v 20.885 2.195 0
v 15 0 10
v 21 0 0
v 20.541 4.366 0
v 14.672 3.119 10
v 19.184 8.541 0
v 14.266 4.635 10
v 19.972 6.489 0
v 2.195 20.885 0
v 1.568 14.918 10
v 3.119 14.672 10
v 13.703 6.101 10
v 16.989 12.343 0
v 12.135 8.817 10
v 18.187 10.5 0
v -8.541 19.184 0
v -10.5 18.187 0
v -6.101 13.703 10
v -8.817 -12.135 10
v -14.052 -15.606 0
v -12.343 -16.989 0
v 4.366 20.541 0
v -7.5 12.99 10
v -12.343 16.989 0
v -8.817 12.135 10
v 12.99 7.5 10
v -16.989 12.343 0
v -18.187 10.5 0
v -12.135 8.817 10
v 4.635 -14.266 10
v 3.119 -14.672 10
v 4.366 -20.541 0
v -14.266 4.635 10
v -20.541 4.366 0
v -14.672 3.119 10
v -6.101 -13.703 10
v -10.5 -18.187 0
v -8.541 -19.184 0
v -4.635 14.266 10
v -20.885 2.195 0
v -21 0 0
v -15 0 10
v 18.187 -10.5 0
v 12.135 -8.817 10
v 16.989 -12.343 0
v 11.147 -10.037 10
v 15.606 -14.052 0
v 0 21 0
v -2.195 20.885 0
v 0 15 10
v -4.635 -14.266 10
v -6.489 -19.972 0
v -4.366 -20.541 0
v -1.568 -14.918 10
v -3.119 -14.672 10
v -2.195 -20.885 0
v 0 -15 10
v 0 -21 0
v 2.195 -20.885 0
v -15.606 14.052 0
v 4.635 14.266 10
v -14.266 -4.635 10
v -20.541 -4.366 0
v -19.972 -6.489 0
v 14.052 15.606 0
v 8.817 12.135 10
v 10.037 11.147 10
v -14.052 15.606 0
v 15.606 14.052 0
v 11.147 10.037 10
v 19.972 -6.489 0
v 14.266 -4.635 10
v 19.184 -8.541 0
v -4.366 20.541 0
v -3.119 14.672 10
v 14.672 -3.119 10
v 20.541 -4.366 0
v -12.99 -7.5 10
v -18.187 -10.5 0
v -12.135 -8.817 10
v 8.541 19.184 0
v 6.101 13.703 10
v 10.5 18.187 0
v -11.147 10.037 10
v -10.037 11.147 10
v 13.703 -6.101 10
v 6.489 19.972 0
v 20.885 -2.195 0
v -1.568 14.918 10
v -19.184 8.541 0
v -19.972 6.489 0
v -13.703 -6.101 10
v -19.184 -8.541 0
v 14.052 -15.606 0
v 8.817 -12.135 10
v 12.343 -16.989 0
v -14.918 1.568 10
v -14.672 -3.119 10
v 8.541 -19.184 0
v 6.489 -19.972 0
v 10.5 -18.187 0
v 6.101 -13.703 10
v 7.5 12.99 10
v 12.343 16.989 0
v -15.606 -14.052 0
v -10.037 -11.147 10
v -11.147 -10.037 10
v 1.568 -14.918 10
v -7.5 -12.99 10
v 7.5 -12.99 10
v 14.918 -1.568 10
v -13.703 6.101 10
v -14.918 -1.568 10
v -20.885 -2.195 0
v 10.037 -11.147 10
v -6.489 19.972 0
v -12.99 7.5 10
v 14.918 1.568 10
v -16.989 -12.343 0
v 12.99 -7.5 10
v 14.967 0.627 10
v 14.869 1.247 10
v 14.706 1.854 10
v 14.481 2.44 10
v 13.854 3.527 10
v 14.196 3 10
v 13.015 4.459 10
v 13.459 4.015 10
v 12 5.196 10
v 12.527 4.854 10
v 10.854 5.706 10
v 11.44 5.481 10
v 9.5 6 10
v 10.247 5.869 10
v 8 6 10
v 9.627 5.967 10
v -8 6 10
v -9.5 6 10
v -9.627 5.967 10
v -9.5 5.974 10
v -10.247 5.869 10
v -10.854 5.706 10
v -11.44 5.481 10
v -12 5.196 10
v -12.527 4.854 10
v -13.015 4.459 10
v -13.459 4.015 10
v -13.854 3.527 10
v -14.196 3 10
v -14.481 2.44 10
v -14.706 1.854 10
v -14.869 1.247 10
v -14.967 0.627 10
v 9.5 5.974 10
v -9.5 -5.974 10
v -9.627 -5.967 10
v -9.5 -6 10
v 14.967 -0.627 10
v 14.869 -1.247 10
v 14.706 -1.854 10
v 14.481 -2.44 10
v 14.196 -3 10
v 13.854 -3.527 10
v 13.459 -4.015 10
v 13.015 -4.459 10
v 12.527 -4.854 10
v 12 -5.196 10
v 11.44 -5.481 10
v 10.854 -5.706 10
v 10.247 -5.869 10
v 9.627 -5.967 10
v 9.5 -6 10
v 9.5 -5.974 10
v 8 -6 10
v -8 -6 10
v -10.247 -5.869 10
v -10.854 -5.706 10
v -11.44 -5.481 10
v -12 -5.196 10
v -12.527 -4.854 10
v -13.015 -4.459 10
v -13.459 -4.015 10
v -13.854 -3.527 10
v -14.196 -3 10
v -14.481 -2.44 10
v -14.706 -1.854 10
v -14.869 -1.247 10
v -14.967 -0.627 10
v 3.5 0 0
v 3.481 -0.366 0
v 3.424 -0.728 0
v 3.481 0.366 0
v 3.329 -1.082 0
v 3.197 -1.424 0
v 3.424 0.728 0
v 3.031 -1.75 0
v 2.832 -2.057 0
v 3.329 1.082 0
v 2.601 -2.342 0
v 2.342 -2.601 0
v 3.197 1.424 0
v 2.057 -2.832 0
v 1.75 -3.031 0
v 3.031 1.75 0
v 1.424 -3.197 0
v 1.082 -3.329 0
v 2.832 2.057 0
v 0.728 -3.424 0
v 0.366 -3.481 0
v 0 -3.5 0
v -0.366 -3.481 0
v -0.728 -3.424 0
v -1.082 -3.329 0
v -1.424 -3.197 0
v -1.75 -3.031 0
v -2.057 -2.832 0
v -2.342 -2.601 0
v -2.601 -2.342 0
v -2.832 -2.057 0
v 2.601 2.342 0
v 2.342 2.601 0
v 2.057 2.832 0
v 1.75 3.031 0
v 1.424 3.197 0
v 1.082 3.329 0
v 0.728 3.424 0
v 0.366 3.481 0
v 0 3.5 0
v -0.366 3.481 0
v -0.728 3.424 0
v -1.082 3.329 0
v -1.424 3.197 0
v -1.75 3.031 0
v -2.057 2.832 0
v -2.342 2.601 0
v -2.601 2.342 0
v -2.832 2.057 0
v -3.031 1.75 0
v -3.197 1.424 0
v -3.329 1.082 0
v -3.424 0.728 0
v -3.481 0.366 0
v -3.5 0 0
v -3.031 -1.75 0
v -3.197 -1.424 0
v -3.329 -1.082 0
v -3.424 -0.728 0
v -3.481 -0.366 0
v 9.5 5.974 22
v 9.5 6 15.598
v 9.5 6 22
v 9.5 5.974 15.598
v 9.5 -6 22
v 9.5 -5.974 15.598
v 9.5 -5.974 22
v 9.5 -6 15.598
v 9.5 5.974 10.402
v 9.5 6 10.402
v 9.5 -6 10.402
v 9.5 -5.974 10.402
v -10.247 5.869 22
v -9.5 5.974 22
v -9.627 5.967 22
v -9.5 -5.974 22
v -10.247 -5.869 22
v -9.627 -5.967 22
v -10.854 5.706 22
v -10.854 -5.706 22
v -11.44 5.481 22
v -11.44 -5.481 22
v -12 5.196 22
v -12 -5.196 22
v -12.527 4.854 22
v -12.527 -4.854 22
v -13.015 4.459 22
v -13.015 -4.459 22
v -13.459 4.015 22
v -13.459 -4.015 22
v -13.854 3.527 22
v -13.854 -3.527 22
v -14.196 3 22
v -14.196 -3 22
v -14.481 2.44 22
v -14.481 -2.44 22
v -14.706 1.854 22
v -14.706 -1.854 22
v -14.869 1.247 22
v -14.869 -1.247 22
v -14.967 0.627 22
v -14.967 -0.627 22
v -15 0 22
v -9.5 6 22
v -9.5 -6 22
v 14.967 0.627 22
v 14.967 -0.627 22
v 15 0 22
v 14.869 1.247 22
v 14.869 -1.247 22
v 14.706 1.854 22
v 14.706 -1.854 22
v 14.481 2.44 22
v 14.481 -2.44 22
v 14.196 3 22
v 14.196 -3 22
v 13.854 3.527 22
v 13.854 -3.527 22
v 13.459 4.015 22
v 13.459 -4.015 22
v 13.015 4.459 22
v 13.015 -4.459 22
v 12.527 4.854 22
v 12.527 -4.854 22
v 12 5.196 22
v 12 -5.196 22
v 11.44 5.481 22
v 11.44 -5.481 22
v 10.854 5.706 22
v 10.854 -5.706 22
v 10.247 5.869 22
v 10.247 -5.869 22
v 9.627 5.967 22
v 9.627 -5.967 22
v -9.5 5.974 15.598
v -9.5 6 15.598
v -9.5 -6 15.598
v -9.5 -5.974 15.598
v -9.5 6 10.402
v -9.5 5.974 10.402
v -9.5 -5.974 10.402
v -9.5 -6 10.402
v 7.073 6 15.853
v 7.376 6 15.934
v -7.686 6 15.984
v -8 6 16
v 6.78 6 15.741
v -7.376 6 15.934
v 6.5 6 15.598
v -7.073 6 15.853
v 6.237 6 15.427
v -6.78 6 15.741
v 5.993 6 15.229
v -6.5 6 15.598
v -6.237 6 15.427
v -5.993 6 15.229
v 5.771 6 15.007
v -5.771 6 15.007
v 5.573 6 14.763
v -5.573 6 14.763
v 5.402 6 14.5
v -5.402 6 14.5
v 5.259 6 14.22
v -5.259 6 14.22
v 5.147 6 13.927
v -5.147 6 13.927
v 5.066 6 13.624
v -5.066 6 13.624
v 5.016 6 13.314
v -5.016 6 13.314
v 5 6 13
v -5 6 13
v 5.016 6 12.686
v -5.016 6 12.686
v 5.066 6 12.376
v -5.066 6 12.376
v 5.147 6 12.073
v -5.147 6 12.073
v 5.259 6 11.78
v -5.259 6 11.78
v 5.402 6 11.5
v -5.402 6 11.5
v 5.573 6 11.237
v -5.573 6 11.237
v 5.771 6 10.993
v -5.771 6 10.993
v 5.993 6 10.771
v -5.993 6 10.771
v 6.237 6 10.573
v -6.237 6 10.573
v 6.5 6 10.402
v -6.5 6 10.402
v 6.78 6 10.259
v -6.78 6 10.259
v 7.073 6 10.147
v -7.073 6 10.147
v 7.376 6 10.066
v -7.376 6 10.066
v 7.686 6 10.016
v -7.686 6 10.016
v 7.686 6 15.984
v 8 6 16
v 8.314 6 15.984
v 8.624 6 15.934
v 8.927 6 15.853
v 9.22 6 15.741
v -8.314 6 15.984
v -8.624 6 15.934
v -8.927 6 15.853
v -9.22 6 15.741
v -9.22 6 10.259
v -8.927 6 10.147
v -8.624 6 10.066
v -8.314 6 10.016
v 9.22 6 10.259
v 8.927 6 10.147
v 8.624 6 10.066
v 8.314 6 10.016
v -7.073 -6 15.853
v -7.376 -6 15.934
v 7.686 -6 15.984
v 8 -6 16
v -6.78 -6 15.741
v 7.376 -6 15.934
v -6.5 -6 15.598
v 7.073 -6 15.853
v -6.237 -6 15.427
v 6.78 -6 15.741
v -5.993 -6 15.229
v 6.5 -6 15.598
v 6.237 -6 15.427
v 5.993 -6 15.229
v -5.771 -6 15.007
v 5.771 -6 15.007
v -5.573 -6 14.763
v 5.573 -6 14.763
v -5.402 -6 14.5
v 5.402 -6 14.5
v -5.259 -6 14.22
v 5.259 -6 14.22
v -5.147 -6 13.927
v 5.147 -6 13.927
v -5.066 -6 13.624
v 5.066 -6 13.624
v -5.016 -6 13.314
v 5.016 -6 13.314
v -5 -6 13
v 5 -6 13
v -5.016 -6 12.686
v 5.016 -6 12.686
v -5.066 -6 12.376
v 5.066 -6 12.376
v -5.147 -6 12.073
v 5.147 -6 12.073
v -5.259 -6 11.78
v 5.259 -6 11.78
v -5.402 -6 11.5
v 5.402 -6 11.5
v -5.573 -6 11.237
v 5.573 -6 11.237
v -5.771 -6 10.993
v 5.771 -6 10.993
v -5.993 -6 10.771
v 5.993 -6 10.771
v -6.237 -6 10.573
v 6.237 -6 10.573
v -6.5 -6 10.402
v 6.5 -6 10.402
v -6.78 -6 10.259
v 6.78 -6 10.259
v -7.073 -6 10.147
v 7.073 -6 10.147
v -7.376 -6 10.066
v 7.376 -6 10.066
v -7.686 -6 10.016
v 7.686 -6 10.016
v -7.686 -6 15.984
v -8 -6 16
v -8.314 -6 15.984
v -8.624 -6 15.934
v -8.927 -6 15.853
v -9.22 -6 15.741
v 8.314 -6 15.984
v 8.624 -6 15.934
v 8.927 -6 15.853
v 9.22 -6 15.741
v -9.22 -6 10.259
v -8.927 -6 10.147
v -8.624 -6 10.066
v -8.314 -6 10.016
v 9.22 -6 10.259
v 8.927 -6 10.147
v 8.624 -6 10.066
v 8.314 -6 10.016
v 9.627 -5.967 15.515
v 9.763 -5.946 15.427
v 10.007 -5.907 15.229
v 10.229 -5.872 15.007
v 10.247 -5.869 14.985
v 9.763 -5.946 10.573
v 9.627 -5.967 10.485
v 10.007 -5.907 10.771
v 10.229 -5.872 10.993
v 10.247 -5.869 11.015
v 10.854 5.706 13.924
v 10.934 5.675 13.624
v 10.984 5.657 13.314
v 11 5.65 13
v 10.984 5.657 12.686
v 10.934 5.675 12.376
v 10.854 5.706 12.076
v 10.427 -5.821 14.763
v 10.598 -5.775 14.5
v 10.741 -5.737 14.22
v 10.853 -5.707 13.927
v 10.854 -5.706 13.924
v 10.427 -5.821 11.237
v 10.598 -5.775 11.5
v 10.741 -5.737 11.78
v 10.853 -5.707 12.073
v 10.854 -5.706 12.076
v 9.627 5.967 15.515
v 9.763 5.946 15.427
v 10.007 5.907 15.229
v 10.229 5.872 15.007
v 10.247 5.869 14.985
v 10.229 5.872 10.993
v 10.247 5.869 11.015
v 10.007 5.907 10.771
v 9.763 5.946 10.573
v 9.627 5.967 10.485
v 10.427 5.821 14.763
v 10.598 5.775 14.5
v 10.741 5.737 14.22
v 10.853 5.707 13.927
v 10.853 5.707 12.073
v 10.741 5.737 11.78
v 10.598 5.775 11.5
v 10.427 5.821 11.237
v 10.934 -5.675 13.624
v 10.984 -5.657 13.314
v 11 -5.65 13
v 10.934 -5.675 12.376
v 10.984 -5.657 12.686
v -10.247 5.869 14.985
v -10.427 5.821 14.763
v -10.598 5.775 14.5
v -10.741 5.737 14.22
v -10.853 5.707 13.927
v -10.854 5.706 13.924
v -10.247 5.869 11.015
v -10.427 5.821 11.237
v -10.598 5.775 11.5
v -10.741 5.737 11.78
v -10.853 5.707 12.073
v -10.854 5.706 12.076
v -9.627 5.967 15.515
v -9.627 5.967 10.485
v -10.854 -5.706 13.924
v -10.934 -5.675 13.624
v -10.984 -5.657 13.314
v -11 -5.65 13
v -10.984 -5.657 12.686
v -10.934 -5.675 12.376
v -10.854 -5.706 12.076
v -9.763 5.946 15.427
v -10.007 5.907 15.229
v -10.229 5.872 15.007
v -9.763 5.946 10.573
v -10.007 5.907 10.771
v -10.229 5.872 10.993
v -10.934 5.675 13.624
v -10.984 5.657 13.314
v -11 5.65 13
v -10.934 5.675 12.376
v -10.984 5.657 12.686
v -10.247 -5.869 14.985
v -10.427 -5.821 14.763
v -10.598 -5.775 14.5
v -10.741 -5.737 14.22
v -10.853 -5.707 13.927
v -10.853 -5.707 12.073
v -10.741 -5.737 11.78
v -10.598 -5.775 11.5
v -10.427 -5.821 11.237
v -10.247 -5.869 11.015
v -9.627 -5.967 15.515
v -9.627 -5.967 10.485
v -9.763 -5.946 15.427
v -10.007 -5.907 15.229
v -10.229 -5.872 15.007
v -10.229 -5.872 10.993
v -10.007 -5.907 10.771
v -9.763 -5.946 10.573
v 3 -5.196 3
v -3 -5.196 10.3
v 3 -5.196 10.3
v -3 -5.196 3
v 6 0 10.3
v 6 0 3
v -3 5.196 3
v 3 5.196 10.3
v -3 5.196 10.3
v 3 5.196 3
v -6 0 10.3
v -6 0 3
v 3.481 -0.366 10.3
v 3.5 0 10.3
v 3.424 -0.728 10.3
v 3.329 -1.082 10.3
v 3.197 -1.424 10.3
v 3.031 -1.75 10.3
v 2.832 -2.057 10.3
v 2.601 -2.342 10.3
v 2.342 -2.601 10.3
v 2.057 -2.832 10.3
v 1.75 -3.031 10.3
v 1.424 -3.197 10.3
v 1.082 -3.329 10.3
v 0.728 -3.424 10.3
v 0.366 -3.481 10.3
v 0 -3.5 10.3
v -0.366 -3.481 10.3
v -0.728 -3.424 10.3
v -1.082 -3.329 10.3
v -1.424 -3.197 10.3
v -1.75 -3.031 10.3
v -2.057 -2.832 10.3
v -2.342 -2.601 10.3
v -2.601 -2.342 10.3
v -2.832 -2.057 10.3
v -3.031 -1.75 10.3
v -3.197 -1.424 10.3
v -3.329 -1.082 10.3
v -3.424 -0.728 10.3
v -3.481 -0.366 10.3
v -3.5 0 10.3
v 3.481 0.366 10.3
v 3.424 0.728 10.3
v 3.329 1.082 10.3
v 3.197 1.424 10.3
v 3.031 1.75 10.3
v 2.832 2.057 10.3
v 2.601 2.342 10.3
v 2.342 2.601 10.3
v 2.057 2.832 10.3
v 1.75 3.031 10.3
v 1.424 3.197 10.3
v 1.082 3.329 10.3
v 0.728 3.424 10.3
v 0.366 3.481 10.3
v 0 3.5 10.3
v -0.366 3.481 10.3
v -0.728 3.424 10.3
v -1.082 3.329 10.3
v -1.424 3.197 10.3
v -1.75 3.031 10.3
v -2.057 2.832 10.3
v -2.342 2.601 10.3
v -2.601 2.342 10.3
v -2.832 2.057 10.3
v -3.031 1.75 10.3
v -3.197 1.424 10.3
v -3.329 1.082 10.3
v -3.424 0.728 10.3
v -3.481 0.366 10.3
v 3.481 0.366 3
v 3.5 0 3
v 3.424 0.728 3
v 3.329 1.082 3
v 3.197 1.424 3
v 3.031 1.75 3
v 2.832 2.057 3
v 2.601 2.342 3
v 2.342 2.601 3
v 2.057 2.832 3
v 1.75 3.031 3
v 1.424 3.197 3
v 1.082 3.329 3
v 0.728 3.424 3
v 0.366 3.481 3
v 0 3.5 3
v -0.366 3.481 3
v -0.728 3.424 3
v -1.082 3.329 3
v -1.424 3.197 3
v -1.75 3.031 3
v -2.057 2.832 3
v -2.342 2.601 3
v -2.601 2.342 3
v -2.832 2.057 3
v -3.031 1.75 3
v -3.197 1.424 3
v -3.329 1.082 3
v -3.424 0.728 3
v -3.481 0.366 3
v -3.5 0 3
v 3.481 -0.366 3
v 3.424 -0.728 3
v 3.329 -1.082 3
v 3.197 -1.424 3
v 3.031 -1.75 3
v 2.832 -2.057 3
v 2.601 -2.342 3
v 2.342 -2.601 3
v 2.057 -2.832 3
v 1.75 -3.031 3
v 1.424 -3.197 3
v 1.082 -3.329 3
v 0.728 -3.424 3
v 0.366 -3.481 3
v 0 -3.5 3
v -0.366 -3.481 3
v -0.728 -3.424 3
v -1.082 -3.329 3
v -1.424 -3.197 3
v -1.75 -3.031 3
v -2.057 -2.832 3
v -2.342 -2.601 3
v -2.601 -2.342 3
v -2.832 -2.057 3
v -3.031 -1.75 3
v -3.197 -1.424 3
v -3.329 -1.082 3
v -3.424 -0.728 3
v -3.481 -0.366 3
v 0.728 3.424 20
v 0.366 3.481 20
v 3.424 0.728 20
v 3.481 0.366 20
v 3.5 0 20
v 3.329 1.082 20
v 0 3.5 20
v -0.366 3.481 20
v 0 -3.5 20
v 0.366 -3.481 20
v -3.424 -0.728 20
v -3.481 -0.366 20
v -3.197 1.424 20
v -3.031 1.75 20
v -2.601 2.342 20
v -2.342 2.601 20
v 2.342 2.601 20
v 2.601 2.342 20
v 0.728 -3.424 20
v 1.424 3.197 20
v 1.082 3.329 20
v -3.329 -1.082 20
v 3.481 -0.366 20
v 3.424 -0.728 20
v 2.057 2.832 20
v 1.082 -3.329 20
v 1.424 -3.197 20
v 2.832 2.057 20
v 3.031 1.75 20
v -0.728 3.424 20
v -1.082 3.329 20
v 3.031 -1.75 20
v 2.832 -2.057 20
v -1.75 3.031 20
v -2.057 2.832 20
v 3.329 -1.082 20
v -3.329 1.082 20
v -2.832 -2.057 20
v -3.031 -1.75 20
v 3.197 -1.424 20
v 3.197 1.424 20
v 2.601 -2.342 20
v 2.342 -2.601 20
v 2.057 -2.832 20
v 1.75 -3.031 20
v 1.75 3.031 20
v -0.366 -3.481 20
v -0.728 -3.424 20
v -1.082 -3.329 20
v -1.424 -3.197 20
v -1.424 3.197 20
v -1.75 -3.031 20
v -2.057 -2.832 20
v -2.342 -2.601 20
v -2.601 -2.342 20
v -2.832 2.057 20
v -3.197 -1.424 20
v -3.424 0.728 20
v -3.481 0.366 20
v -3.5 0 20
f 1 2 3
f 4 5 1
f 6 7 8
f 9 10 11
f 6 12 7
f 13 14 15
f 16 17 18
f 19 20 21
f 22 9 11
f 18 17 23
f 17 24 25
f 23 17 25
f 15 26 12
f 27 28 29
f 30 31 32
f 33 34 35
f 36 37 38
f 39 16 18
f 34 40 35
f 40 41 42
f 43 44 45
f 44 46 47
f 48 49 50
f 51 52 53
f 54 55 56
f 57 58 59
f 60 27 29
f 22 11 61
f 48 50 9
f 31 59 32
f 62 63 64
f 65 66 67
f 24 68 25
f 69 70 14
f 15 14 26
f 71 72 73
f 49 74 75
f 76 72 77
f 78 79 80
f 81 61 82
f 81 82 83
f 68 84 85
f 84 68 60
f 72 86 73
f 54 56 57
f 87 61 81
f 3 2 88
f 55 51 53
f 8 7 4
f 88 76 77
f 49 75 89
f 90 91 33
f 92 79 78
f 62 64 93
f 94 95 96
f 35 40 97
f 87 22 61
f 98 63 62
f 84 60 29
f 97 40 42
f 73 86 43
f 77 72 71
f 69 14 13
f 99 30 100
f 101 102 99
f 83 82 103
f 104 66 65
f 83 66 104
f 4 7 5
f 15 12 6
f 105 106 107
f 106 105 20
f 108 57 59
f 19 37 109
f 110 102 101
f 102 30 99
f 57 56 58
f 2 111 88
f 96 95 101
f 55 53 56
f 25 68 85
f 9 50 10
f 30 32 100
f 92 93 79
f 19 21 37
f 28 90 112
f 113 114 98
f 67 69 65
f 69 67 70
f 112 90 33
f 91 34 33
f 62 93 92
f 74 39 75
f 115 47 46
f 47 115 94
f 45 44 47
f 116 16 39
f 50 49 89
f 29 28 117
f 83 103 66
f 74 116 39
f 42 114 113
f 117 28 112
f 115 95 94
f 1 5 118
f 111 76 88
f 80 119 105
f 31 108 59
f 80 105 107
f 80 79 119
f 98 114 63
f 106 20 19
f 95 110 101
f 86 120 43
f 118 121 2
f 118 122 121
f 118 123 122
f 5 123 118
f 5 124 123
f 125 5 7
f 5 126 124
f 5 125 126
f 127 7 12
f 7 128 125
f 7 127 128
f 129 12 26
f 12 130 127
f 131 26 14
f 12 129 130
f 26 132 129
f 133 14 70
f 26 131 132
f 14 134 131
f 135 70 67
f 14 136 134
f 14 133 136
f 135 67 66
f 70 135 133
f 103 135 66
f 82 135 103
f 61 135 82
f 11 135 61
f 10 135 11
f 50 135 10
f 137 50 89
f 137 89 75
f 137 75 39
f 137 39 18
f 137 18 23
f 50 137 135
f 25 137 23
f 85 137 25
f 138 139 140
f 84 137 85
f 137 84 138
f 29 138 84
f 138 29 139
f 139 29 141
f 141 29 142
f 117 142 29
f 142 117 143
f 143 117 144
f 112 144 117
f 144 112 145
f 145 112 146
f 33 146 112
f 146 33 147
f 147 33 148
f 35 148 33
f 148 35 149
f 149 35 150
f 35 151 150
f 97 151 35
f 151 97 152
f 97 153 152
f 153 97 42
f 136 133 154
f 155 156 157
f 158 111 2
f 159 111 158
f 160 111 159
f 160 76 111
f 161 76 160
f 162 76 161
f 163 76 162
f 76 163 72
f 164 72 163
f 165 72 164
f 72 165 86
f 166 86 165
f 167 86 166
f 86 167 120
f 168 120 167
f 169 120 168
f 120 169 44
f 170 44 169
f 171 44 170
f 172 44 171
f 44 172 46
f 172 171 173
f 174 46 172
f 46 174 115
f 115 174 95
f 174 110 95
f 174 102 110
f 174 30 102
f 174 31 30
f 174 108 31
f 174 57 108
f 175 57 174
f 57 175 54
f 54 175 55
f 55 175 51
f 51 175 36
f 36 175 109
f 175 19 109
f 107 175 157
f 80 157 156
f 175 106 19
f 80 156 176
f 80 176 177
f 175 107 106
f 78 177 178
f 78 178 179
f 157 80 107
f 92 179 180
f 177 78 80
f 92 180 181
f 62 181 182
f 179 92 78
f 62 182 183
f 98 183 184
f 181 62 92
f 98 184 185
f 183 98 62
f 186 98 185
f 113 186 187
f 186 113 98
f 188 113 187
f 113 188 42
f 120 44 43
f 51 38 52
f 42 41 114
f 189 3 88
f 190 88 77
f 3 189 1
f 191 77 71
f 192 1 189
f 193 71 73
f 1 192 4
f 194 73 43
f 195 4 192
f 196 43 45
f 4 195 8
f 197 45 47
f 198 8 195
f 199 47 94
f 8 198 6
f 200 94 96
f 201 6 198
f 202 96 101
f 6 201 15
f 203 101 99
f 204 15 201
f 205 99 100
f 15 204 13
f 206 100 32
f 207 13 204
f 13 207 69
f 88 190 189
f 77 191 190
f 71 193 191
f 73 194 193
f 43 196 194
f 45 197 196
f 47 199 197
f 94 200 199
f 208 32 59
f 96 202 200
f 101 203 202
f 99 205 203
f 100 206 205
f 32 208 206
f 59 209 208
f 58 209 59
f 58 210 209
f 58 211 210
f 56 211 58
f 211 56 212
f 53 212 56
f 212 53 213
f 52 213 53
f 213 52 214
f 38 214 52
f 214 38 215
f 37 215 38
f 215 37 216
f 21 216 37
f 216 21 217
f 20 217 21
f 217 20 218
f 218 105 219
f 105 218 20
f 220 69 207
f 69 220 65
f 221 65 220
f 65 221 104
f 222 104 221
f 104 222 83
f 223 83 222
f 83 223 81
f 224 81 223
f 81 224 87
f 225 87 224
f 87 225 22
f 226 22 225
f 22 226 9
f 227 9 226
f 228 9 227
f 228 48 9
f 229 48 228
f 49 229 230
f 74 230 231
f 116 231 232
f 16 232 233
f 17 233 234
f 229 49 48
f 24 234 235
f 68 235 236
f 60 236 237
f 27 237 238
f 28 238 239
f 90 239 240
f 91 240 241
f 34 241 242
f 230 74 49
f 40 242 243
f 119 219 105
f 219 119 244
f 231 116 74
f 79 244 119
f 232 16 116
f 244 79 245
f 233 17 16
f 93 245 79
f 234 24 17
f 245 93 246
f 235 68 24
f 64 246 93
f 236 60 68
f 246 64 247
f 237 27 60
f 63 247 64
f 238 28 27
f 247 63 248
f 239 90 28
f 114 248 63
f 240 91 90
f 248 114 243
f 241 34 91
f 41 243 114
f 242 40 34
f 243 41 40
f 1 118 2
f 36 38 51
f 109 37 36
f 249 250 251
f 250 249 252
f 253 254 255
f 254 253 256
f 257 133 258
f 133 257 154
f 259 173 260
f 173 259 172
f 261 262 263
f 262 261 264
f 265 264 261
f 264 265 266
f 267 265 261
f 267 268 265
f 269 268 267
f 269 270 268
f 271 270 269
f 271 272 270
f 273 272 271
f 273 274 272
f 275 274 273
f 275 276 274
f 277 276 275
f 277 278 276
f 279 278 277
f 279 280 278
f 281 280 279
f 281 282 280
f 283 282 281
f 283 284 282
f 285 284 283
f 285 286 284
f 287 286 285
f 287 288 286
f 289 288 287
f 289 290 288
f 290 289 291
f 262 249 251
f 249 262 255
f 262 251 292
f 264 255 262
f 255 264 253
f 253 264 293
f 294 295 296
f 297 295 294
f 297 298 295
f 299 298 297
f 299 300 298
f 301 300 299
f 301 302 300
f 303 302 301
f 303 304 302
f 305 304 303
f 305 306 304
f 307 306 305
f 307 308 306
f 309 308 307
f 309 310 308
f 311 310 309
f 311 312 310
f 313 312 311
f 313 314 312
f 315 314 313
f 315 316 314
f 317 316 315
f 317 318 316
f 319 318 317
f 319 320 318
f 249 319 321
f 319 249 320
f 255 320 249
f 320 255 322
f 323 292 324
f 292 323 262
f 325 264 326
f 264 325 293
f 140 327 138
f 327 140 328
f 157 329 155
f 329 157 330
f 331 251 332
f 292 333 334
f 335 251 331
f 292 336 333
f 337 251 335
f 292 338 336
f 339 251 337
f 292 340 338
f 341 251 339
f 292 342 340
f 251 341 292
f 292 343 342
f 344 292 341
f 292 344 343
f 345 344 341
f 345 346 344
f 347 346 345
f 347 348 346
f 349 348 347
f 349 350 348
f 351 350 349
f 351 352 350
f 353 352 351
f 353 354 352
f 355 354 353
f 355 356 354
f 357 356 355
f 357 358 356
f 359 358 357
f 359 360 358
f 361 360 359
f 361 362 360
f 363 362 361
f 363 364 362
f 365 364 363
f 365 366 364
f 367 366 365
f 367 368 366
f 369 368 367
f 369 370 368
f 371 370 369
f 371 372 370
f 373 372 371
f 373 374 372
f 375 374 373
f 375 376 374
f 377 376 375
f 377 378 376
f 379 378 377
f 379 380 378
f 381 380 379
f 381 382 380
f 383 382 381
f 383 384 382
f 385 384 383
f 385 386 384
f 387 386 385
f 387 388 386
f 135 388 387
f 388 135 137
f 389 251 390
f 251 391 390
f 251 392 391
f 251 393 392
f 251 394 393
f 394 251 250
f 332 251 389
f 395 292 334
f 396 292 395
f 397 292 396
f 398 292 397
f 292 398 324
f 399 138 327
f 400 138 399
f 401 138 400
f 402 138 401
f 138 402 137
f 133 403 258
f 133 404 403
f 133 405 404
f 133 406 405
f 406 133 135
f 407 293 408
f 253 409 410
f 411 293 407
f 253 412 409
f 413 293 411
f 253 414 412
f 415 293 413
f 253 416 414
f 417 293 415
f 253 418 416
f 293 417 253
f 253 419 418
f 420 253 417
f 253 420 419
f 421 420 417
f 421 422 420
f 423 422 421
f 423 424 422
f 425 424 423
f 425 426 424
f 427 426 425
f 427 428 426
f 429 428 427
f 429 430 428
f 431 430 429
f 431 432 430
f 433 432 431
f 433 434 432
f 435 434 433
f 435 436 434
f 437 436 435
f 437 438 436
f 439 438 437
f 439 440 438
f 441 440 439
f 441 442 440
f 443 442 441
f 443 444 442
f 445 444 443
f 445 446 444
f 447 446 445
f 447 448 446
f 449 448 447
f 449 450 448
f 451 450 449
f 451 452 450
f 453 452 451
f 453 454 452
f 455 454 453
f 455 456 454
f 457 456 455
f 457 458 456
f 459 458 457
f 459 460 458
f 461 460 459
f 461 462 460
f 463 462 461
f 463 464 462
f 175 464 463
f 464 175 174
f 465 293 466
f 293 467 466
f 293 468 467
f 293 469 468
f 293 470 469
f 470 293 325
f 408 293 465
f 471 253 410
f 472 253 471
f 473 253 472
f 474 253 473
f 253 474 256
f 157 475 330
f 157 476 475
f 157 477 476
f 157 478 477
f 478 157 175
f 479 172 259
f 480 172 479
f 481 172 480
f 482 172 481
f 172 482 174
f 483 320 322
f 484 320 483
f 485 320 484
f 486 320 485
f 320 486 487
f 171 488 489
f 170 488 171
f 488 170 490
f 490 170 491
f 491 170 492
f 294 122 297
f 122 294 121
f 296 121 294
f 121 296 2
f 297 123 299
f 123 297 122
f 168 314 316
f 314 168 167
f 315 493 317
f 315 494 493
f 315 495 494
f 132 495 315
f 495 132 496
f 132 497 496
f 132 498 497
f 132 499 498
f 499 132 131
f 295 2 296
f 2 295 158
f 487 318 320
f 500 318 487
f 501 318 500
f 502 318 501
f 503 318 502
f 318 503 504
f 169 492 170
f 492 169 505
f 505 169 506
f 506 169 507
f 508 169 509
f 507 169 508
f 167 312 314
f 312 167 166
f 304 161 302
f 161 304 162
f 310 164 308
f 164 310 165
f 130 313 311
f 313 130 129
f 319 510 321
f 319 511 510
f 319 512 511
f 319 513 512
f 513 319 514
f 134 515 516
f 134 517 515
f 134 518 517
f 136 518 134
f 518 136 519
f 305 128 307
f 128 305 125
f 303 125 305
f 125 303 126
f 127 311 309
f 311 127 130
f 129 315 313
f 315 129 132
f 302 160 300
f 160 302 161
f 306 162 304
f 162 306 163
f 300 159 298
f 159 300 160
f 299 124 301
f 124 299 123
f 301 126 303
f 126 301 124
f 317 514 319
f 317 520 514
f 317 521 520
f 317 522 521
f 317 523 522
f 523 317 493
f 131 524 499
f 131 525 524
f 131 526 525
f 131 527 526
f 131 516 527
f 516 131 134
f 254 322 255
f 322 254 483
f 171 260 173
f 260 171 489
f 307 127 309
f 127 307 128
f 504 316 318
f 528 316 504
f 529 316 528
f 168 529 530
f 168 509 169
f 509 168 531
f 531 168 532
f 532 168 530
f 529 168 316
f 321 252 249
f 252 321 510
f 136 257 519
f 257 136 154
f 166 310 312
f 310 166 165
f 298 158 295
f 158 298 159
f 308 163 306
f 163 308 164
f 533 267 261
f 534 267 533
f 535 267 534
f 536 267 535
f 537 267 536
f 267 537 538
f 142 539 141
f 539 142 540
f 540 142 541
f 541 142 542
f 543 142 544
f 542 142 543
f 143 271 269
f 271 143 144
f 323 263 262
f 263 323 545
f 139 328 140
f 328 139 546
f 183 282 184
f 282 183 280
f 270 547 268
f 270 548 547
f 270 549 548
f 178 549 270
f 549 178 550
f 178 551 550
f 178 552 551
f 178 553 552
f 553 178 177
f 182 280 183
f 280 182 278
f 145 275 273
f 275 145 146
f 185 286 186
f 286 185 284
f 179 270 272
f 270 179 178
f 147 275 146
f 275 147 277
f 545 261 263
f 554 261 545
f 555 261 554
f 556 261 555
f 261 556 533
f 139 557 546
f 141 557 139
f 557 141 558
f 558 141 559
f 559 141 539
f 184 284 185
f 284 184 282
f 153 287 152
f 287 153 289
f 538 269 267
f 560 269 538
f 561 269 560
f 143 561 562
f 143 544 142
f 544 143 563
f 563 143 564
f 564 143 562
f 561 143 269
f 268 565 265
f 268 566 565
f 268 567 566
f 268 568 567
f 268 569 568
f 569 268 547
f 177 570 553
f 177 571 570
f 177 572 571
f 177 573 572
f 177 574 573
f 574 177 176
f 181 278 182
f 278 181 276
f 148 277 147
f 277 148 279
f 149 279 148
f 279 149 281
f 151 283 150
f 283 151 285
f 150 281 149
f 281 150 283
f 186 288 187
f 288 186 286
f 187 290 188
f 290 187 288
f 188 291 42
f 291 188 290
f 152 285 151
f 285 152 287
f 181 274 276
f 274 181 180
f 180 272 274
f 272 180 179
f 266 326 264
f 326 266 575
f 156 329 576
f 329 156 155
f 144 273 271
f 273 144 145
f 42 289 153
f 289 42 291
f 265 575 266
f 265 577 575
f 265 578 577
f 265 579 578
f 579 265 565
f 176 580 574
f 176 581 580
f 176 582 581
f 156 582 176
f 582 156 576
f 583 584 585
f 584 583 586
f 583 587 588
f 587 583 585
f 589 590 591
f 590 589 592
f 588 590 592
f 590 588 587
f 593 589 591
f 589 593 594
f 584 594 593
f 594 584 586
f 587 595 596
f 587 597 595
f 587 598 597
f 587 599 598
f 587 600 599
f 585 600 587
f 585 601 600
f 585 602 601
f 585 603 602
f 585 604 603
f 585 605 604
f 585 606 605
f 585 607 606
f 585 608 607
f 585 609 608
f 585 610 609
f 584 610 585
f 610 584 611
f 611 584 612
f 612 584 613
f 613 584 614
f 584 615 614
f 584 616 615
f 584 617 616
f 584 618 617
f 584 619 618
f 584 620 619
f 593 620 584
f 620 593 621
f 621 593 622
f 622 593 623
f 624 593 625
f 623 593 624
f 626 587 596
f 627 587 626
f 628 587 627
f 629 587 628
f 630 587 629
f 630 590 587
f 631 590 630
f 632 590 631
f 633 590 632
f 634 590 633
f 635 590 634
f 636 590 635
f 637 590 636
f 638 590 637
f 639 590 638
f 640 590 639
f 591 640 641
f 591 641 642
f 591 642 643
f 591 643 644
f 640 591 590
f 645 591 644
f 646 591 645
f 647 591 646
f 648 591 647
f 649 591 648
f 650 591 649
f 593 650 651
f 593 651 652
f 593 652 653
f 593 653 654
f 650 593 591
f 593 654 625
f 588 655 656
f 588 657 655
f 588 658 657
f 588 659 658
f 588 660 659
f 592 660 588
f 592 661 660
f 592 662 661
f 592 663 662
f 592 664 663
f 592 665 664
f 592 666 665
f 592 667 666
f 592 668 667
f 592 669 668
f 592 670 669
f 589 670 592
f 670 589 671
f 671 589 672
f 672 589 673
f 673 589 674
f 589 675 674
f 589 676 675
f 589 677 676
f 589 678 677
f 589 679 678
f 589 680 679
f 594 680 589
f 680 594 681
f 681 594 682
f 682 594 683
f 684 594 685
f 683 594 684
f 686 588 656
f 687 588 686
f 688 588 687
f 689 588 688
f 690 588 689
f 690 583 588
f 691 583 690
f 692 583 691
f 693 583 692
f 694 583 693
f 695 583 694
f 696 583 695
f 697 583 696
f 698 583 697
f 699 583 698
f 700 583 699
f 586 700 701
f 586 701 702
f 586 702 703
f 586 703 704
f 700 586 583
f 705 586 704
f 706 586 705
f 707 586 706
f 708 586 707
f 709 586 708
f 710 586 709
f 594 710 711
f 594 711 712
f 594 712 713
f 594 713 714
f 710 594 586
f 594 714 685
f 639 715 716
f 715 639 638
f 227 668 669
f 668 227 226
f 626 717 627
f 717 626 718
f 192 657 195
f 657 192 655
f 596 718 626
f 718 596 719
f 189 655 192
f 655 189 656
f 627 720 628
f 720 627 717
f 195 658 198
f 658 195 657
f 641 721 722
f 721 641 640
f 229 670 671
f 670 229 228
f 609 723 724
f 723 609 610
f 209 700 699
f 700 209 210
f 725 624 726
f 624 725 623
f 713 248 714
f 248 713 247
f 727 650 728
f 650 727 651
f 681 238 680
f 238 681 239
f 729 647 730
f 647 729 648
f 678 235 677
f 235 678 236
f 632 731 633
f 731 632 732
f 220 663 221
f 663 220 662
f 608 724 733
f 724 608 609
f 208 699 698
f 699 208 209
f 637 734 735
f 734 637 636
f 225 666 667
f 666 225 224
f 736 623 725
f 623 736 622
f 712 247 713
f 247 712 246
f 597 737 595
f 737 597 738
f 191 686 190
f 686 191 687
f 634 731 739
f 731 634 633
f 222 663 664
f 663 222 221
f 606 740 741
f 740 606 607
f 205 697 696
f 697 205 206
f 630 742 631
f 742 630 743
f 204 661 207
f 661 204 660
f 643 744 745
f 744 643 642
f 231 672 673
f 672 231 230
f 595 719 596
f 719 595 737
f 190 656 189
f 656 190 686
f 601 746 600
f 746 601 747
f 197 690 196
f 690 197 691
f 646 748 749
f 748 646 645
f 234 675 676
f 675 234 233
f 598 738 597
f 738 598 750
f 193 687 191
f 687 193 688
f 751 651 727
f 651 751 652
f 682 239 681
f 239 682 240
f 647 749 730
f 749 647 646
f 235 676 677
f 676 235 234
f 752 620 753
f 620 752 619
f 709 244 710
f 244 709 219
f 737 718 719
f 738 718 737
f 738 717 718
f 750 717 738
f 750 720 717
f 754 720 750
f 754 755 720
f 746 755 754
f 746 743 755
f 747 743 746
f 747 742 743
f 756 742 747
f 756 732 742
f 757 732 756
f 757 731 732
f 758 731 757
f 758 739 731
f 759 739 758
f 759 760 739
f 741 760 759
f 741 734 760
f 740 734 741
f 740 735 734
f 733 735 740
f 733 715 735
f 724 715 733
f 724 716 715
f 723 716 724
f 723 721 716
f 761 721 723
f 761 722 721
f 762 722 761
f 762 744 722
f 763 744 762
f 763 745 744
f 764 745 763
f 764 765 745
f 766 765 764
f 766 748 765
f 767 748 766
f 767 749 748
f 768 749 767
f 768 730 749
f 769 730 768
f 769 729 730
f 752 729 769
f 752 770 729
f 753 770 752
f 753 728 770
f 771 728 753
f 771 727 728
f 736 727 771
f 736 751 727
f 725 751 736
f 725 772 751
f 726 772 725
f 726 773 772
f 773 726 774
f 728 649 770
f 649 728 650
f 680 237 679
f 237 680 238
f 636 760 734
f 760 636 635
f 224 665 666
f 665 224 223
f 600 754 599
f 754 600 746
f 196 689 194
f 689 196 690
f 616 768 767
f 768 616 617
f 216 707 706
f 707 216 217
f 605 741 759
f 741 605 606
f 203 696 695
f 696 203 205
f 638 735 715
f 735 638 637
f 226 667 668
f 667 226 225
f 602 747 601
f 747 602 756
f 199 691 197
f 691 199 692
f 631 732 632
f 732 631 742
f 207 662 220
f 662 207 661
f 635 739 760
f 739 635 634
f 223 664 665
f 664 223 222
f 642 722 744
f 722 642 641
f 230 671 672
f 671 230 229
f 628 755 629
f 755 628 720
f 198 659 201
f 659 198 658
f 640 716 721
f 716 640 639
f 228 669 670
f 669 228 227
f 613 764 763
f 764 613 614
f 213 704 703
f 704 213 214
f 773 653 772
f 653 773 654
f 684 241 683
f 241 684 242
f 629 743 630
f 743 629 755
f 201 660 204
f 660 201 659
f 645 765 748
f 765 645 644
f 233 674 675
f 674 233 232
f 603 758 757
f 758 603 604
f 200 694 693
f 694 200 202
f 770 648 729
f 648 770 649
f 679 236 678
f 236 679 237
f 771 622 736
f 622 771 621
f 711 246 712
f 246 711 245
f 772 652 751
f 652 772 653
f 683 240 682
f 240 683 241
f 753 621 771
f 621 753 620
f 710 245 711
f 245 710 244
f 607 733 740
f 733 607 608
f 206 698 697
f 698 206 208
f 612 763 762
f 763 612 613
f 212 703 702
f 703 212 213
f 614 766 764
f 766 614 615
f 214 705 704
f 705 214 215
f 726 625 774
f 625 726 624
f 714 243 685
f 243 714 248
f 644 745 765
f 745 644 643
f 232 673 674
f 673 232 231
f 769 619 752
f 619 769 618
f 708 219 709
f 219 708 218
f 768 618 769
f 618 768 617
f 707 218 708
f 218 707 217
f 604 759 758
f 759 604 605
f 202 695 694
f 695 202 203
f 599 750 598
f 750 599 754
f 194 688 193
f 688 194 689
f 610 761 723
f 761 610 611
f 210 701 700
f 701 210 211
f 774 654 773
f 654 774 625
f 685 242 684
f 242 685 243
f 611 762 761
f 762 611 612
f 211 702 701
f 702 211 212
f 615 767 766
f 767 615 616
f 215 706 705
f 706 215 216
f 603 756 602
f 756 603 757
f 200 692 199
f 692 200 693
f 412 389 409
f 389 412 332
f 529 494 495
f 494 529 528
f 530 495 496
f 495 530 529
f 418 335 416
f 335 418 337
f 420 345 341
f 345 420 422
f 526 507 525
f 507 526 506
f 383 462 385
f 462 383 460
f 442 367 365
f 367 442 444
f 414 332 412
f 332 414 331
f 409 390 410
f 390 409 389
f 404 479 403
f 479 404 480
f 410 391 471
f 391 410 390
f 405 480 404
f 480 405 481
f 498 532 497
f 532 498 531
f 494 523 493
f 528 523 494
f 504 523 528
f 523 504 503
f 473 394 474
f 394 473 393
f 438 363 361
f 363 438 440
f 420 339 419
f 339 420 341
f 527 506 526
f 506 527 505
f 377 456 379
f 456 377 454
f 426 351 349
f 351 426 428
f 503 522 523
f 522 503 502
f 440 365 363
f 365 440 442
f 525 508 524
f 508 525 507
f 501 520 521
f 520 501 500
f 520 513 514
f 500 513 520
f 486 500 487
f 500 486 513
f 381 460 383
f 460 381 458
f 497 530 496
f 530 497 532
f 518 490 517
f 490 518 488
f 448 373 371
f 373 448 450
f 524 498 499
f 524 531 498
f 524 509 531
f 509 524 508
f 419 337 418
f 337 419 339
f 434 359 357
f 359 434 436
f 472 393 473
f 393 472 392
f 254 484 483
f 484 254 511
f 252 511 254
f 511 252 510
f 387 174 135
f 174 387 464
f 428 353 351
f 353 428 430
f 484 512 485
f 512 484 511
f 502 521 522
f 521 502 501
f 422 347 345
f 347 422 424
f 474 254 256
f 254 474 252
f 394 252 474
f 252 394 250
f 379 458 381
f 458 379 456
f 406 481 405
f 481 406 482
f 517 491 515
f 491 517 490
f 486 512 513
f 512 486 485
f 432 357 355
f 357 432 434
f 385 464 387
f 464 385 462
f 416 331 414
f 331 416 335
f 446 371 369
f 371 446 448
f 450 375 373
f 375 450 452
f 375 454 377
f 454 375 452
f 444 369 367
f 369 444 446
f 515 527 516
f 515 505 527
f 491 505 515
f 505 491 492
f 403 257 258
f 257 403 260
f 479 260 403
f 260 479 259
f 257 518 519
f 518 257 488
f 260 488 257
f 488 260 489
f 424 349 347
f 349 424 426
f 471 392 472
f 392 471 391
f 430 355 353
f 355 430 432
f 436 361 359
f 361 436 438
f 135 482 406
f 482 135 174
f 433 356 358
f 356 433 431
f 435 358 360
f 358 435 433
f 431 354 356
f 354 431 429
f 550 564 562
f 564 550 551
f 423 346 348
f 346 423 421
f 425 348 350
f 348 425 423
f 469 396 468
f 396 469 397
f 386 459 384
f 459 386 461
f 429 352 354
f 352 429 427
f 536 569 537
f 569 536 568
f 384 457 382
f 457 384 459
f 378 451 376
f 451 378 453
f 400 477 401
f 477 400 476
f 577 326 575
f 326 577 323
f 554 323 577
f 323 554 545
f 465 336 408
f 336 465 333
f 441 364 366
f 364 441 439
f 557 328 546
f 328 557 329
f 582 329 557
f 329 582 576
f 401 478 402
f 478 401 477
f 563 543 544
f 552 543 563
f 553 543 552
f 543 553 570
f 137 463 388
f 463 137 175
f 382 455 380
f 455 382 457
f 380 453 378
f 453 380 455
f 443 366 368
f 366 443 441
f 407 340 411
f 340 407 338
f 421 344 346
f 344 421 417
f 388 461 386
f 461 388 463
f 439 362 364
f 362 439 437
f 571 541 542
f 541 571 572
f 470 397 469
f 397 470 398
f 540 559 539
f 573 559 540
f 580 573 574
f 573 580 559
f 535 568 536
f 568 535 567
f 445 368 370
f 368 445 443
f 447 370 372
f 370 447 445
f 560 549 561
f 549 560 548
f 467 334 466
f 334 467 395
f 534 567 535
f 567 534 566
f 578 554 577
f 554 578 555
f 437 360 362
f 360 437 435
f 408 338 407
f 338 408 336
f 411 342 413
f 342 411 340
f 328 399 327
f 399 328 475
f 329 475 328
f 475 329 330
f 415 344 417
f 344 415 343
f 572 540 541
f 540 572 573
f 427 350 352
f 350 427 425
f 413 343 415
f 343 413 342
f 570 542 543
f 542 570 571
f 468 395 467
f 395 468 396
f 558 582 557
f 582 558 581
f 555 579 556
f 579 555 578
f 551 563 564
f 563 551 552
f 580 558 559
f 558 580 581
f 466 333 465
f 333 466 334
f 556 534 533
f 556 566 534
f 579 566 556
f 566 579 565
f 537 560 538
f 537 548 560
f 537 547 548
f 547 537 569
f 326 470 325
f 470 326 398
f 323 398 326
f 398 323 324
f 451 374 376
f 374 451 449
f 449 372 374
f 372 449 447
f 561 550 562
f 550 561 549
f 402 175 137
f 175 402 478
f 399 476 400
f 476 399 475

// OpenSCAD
module nut()
{
    $fn = 6;
cylinder(7.3,6,6);
};
   $fn = 60;
difference()
{
    union()
    {
        difference(){
              union(){
                cylinder(10,21,15);
                translate([0,0,14.5]) cube([19,12,15], true);
                 translate([9,0,5]) cylinder(17,6,6);
                 translate([-9,0,5]) cylinder(17,6,6);
                }
            translate([0,0,3]) nut();
              translate([0,0,-4])    cylinder(24,3.5,3.5);

        }
    }
    translate([0,25,0]) cube([50,5,200], true);
       translate([8,0,13]) rotate([90,0,0]) cylinder(15,3,3, true);
   translate([-8,0,13]) rotate([90,0,0]) cylinder(15,3,3, true);
}
